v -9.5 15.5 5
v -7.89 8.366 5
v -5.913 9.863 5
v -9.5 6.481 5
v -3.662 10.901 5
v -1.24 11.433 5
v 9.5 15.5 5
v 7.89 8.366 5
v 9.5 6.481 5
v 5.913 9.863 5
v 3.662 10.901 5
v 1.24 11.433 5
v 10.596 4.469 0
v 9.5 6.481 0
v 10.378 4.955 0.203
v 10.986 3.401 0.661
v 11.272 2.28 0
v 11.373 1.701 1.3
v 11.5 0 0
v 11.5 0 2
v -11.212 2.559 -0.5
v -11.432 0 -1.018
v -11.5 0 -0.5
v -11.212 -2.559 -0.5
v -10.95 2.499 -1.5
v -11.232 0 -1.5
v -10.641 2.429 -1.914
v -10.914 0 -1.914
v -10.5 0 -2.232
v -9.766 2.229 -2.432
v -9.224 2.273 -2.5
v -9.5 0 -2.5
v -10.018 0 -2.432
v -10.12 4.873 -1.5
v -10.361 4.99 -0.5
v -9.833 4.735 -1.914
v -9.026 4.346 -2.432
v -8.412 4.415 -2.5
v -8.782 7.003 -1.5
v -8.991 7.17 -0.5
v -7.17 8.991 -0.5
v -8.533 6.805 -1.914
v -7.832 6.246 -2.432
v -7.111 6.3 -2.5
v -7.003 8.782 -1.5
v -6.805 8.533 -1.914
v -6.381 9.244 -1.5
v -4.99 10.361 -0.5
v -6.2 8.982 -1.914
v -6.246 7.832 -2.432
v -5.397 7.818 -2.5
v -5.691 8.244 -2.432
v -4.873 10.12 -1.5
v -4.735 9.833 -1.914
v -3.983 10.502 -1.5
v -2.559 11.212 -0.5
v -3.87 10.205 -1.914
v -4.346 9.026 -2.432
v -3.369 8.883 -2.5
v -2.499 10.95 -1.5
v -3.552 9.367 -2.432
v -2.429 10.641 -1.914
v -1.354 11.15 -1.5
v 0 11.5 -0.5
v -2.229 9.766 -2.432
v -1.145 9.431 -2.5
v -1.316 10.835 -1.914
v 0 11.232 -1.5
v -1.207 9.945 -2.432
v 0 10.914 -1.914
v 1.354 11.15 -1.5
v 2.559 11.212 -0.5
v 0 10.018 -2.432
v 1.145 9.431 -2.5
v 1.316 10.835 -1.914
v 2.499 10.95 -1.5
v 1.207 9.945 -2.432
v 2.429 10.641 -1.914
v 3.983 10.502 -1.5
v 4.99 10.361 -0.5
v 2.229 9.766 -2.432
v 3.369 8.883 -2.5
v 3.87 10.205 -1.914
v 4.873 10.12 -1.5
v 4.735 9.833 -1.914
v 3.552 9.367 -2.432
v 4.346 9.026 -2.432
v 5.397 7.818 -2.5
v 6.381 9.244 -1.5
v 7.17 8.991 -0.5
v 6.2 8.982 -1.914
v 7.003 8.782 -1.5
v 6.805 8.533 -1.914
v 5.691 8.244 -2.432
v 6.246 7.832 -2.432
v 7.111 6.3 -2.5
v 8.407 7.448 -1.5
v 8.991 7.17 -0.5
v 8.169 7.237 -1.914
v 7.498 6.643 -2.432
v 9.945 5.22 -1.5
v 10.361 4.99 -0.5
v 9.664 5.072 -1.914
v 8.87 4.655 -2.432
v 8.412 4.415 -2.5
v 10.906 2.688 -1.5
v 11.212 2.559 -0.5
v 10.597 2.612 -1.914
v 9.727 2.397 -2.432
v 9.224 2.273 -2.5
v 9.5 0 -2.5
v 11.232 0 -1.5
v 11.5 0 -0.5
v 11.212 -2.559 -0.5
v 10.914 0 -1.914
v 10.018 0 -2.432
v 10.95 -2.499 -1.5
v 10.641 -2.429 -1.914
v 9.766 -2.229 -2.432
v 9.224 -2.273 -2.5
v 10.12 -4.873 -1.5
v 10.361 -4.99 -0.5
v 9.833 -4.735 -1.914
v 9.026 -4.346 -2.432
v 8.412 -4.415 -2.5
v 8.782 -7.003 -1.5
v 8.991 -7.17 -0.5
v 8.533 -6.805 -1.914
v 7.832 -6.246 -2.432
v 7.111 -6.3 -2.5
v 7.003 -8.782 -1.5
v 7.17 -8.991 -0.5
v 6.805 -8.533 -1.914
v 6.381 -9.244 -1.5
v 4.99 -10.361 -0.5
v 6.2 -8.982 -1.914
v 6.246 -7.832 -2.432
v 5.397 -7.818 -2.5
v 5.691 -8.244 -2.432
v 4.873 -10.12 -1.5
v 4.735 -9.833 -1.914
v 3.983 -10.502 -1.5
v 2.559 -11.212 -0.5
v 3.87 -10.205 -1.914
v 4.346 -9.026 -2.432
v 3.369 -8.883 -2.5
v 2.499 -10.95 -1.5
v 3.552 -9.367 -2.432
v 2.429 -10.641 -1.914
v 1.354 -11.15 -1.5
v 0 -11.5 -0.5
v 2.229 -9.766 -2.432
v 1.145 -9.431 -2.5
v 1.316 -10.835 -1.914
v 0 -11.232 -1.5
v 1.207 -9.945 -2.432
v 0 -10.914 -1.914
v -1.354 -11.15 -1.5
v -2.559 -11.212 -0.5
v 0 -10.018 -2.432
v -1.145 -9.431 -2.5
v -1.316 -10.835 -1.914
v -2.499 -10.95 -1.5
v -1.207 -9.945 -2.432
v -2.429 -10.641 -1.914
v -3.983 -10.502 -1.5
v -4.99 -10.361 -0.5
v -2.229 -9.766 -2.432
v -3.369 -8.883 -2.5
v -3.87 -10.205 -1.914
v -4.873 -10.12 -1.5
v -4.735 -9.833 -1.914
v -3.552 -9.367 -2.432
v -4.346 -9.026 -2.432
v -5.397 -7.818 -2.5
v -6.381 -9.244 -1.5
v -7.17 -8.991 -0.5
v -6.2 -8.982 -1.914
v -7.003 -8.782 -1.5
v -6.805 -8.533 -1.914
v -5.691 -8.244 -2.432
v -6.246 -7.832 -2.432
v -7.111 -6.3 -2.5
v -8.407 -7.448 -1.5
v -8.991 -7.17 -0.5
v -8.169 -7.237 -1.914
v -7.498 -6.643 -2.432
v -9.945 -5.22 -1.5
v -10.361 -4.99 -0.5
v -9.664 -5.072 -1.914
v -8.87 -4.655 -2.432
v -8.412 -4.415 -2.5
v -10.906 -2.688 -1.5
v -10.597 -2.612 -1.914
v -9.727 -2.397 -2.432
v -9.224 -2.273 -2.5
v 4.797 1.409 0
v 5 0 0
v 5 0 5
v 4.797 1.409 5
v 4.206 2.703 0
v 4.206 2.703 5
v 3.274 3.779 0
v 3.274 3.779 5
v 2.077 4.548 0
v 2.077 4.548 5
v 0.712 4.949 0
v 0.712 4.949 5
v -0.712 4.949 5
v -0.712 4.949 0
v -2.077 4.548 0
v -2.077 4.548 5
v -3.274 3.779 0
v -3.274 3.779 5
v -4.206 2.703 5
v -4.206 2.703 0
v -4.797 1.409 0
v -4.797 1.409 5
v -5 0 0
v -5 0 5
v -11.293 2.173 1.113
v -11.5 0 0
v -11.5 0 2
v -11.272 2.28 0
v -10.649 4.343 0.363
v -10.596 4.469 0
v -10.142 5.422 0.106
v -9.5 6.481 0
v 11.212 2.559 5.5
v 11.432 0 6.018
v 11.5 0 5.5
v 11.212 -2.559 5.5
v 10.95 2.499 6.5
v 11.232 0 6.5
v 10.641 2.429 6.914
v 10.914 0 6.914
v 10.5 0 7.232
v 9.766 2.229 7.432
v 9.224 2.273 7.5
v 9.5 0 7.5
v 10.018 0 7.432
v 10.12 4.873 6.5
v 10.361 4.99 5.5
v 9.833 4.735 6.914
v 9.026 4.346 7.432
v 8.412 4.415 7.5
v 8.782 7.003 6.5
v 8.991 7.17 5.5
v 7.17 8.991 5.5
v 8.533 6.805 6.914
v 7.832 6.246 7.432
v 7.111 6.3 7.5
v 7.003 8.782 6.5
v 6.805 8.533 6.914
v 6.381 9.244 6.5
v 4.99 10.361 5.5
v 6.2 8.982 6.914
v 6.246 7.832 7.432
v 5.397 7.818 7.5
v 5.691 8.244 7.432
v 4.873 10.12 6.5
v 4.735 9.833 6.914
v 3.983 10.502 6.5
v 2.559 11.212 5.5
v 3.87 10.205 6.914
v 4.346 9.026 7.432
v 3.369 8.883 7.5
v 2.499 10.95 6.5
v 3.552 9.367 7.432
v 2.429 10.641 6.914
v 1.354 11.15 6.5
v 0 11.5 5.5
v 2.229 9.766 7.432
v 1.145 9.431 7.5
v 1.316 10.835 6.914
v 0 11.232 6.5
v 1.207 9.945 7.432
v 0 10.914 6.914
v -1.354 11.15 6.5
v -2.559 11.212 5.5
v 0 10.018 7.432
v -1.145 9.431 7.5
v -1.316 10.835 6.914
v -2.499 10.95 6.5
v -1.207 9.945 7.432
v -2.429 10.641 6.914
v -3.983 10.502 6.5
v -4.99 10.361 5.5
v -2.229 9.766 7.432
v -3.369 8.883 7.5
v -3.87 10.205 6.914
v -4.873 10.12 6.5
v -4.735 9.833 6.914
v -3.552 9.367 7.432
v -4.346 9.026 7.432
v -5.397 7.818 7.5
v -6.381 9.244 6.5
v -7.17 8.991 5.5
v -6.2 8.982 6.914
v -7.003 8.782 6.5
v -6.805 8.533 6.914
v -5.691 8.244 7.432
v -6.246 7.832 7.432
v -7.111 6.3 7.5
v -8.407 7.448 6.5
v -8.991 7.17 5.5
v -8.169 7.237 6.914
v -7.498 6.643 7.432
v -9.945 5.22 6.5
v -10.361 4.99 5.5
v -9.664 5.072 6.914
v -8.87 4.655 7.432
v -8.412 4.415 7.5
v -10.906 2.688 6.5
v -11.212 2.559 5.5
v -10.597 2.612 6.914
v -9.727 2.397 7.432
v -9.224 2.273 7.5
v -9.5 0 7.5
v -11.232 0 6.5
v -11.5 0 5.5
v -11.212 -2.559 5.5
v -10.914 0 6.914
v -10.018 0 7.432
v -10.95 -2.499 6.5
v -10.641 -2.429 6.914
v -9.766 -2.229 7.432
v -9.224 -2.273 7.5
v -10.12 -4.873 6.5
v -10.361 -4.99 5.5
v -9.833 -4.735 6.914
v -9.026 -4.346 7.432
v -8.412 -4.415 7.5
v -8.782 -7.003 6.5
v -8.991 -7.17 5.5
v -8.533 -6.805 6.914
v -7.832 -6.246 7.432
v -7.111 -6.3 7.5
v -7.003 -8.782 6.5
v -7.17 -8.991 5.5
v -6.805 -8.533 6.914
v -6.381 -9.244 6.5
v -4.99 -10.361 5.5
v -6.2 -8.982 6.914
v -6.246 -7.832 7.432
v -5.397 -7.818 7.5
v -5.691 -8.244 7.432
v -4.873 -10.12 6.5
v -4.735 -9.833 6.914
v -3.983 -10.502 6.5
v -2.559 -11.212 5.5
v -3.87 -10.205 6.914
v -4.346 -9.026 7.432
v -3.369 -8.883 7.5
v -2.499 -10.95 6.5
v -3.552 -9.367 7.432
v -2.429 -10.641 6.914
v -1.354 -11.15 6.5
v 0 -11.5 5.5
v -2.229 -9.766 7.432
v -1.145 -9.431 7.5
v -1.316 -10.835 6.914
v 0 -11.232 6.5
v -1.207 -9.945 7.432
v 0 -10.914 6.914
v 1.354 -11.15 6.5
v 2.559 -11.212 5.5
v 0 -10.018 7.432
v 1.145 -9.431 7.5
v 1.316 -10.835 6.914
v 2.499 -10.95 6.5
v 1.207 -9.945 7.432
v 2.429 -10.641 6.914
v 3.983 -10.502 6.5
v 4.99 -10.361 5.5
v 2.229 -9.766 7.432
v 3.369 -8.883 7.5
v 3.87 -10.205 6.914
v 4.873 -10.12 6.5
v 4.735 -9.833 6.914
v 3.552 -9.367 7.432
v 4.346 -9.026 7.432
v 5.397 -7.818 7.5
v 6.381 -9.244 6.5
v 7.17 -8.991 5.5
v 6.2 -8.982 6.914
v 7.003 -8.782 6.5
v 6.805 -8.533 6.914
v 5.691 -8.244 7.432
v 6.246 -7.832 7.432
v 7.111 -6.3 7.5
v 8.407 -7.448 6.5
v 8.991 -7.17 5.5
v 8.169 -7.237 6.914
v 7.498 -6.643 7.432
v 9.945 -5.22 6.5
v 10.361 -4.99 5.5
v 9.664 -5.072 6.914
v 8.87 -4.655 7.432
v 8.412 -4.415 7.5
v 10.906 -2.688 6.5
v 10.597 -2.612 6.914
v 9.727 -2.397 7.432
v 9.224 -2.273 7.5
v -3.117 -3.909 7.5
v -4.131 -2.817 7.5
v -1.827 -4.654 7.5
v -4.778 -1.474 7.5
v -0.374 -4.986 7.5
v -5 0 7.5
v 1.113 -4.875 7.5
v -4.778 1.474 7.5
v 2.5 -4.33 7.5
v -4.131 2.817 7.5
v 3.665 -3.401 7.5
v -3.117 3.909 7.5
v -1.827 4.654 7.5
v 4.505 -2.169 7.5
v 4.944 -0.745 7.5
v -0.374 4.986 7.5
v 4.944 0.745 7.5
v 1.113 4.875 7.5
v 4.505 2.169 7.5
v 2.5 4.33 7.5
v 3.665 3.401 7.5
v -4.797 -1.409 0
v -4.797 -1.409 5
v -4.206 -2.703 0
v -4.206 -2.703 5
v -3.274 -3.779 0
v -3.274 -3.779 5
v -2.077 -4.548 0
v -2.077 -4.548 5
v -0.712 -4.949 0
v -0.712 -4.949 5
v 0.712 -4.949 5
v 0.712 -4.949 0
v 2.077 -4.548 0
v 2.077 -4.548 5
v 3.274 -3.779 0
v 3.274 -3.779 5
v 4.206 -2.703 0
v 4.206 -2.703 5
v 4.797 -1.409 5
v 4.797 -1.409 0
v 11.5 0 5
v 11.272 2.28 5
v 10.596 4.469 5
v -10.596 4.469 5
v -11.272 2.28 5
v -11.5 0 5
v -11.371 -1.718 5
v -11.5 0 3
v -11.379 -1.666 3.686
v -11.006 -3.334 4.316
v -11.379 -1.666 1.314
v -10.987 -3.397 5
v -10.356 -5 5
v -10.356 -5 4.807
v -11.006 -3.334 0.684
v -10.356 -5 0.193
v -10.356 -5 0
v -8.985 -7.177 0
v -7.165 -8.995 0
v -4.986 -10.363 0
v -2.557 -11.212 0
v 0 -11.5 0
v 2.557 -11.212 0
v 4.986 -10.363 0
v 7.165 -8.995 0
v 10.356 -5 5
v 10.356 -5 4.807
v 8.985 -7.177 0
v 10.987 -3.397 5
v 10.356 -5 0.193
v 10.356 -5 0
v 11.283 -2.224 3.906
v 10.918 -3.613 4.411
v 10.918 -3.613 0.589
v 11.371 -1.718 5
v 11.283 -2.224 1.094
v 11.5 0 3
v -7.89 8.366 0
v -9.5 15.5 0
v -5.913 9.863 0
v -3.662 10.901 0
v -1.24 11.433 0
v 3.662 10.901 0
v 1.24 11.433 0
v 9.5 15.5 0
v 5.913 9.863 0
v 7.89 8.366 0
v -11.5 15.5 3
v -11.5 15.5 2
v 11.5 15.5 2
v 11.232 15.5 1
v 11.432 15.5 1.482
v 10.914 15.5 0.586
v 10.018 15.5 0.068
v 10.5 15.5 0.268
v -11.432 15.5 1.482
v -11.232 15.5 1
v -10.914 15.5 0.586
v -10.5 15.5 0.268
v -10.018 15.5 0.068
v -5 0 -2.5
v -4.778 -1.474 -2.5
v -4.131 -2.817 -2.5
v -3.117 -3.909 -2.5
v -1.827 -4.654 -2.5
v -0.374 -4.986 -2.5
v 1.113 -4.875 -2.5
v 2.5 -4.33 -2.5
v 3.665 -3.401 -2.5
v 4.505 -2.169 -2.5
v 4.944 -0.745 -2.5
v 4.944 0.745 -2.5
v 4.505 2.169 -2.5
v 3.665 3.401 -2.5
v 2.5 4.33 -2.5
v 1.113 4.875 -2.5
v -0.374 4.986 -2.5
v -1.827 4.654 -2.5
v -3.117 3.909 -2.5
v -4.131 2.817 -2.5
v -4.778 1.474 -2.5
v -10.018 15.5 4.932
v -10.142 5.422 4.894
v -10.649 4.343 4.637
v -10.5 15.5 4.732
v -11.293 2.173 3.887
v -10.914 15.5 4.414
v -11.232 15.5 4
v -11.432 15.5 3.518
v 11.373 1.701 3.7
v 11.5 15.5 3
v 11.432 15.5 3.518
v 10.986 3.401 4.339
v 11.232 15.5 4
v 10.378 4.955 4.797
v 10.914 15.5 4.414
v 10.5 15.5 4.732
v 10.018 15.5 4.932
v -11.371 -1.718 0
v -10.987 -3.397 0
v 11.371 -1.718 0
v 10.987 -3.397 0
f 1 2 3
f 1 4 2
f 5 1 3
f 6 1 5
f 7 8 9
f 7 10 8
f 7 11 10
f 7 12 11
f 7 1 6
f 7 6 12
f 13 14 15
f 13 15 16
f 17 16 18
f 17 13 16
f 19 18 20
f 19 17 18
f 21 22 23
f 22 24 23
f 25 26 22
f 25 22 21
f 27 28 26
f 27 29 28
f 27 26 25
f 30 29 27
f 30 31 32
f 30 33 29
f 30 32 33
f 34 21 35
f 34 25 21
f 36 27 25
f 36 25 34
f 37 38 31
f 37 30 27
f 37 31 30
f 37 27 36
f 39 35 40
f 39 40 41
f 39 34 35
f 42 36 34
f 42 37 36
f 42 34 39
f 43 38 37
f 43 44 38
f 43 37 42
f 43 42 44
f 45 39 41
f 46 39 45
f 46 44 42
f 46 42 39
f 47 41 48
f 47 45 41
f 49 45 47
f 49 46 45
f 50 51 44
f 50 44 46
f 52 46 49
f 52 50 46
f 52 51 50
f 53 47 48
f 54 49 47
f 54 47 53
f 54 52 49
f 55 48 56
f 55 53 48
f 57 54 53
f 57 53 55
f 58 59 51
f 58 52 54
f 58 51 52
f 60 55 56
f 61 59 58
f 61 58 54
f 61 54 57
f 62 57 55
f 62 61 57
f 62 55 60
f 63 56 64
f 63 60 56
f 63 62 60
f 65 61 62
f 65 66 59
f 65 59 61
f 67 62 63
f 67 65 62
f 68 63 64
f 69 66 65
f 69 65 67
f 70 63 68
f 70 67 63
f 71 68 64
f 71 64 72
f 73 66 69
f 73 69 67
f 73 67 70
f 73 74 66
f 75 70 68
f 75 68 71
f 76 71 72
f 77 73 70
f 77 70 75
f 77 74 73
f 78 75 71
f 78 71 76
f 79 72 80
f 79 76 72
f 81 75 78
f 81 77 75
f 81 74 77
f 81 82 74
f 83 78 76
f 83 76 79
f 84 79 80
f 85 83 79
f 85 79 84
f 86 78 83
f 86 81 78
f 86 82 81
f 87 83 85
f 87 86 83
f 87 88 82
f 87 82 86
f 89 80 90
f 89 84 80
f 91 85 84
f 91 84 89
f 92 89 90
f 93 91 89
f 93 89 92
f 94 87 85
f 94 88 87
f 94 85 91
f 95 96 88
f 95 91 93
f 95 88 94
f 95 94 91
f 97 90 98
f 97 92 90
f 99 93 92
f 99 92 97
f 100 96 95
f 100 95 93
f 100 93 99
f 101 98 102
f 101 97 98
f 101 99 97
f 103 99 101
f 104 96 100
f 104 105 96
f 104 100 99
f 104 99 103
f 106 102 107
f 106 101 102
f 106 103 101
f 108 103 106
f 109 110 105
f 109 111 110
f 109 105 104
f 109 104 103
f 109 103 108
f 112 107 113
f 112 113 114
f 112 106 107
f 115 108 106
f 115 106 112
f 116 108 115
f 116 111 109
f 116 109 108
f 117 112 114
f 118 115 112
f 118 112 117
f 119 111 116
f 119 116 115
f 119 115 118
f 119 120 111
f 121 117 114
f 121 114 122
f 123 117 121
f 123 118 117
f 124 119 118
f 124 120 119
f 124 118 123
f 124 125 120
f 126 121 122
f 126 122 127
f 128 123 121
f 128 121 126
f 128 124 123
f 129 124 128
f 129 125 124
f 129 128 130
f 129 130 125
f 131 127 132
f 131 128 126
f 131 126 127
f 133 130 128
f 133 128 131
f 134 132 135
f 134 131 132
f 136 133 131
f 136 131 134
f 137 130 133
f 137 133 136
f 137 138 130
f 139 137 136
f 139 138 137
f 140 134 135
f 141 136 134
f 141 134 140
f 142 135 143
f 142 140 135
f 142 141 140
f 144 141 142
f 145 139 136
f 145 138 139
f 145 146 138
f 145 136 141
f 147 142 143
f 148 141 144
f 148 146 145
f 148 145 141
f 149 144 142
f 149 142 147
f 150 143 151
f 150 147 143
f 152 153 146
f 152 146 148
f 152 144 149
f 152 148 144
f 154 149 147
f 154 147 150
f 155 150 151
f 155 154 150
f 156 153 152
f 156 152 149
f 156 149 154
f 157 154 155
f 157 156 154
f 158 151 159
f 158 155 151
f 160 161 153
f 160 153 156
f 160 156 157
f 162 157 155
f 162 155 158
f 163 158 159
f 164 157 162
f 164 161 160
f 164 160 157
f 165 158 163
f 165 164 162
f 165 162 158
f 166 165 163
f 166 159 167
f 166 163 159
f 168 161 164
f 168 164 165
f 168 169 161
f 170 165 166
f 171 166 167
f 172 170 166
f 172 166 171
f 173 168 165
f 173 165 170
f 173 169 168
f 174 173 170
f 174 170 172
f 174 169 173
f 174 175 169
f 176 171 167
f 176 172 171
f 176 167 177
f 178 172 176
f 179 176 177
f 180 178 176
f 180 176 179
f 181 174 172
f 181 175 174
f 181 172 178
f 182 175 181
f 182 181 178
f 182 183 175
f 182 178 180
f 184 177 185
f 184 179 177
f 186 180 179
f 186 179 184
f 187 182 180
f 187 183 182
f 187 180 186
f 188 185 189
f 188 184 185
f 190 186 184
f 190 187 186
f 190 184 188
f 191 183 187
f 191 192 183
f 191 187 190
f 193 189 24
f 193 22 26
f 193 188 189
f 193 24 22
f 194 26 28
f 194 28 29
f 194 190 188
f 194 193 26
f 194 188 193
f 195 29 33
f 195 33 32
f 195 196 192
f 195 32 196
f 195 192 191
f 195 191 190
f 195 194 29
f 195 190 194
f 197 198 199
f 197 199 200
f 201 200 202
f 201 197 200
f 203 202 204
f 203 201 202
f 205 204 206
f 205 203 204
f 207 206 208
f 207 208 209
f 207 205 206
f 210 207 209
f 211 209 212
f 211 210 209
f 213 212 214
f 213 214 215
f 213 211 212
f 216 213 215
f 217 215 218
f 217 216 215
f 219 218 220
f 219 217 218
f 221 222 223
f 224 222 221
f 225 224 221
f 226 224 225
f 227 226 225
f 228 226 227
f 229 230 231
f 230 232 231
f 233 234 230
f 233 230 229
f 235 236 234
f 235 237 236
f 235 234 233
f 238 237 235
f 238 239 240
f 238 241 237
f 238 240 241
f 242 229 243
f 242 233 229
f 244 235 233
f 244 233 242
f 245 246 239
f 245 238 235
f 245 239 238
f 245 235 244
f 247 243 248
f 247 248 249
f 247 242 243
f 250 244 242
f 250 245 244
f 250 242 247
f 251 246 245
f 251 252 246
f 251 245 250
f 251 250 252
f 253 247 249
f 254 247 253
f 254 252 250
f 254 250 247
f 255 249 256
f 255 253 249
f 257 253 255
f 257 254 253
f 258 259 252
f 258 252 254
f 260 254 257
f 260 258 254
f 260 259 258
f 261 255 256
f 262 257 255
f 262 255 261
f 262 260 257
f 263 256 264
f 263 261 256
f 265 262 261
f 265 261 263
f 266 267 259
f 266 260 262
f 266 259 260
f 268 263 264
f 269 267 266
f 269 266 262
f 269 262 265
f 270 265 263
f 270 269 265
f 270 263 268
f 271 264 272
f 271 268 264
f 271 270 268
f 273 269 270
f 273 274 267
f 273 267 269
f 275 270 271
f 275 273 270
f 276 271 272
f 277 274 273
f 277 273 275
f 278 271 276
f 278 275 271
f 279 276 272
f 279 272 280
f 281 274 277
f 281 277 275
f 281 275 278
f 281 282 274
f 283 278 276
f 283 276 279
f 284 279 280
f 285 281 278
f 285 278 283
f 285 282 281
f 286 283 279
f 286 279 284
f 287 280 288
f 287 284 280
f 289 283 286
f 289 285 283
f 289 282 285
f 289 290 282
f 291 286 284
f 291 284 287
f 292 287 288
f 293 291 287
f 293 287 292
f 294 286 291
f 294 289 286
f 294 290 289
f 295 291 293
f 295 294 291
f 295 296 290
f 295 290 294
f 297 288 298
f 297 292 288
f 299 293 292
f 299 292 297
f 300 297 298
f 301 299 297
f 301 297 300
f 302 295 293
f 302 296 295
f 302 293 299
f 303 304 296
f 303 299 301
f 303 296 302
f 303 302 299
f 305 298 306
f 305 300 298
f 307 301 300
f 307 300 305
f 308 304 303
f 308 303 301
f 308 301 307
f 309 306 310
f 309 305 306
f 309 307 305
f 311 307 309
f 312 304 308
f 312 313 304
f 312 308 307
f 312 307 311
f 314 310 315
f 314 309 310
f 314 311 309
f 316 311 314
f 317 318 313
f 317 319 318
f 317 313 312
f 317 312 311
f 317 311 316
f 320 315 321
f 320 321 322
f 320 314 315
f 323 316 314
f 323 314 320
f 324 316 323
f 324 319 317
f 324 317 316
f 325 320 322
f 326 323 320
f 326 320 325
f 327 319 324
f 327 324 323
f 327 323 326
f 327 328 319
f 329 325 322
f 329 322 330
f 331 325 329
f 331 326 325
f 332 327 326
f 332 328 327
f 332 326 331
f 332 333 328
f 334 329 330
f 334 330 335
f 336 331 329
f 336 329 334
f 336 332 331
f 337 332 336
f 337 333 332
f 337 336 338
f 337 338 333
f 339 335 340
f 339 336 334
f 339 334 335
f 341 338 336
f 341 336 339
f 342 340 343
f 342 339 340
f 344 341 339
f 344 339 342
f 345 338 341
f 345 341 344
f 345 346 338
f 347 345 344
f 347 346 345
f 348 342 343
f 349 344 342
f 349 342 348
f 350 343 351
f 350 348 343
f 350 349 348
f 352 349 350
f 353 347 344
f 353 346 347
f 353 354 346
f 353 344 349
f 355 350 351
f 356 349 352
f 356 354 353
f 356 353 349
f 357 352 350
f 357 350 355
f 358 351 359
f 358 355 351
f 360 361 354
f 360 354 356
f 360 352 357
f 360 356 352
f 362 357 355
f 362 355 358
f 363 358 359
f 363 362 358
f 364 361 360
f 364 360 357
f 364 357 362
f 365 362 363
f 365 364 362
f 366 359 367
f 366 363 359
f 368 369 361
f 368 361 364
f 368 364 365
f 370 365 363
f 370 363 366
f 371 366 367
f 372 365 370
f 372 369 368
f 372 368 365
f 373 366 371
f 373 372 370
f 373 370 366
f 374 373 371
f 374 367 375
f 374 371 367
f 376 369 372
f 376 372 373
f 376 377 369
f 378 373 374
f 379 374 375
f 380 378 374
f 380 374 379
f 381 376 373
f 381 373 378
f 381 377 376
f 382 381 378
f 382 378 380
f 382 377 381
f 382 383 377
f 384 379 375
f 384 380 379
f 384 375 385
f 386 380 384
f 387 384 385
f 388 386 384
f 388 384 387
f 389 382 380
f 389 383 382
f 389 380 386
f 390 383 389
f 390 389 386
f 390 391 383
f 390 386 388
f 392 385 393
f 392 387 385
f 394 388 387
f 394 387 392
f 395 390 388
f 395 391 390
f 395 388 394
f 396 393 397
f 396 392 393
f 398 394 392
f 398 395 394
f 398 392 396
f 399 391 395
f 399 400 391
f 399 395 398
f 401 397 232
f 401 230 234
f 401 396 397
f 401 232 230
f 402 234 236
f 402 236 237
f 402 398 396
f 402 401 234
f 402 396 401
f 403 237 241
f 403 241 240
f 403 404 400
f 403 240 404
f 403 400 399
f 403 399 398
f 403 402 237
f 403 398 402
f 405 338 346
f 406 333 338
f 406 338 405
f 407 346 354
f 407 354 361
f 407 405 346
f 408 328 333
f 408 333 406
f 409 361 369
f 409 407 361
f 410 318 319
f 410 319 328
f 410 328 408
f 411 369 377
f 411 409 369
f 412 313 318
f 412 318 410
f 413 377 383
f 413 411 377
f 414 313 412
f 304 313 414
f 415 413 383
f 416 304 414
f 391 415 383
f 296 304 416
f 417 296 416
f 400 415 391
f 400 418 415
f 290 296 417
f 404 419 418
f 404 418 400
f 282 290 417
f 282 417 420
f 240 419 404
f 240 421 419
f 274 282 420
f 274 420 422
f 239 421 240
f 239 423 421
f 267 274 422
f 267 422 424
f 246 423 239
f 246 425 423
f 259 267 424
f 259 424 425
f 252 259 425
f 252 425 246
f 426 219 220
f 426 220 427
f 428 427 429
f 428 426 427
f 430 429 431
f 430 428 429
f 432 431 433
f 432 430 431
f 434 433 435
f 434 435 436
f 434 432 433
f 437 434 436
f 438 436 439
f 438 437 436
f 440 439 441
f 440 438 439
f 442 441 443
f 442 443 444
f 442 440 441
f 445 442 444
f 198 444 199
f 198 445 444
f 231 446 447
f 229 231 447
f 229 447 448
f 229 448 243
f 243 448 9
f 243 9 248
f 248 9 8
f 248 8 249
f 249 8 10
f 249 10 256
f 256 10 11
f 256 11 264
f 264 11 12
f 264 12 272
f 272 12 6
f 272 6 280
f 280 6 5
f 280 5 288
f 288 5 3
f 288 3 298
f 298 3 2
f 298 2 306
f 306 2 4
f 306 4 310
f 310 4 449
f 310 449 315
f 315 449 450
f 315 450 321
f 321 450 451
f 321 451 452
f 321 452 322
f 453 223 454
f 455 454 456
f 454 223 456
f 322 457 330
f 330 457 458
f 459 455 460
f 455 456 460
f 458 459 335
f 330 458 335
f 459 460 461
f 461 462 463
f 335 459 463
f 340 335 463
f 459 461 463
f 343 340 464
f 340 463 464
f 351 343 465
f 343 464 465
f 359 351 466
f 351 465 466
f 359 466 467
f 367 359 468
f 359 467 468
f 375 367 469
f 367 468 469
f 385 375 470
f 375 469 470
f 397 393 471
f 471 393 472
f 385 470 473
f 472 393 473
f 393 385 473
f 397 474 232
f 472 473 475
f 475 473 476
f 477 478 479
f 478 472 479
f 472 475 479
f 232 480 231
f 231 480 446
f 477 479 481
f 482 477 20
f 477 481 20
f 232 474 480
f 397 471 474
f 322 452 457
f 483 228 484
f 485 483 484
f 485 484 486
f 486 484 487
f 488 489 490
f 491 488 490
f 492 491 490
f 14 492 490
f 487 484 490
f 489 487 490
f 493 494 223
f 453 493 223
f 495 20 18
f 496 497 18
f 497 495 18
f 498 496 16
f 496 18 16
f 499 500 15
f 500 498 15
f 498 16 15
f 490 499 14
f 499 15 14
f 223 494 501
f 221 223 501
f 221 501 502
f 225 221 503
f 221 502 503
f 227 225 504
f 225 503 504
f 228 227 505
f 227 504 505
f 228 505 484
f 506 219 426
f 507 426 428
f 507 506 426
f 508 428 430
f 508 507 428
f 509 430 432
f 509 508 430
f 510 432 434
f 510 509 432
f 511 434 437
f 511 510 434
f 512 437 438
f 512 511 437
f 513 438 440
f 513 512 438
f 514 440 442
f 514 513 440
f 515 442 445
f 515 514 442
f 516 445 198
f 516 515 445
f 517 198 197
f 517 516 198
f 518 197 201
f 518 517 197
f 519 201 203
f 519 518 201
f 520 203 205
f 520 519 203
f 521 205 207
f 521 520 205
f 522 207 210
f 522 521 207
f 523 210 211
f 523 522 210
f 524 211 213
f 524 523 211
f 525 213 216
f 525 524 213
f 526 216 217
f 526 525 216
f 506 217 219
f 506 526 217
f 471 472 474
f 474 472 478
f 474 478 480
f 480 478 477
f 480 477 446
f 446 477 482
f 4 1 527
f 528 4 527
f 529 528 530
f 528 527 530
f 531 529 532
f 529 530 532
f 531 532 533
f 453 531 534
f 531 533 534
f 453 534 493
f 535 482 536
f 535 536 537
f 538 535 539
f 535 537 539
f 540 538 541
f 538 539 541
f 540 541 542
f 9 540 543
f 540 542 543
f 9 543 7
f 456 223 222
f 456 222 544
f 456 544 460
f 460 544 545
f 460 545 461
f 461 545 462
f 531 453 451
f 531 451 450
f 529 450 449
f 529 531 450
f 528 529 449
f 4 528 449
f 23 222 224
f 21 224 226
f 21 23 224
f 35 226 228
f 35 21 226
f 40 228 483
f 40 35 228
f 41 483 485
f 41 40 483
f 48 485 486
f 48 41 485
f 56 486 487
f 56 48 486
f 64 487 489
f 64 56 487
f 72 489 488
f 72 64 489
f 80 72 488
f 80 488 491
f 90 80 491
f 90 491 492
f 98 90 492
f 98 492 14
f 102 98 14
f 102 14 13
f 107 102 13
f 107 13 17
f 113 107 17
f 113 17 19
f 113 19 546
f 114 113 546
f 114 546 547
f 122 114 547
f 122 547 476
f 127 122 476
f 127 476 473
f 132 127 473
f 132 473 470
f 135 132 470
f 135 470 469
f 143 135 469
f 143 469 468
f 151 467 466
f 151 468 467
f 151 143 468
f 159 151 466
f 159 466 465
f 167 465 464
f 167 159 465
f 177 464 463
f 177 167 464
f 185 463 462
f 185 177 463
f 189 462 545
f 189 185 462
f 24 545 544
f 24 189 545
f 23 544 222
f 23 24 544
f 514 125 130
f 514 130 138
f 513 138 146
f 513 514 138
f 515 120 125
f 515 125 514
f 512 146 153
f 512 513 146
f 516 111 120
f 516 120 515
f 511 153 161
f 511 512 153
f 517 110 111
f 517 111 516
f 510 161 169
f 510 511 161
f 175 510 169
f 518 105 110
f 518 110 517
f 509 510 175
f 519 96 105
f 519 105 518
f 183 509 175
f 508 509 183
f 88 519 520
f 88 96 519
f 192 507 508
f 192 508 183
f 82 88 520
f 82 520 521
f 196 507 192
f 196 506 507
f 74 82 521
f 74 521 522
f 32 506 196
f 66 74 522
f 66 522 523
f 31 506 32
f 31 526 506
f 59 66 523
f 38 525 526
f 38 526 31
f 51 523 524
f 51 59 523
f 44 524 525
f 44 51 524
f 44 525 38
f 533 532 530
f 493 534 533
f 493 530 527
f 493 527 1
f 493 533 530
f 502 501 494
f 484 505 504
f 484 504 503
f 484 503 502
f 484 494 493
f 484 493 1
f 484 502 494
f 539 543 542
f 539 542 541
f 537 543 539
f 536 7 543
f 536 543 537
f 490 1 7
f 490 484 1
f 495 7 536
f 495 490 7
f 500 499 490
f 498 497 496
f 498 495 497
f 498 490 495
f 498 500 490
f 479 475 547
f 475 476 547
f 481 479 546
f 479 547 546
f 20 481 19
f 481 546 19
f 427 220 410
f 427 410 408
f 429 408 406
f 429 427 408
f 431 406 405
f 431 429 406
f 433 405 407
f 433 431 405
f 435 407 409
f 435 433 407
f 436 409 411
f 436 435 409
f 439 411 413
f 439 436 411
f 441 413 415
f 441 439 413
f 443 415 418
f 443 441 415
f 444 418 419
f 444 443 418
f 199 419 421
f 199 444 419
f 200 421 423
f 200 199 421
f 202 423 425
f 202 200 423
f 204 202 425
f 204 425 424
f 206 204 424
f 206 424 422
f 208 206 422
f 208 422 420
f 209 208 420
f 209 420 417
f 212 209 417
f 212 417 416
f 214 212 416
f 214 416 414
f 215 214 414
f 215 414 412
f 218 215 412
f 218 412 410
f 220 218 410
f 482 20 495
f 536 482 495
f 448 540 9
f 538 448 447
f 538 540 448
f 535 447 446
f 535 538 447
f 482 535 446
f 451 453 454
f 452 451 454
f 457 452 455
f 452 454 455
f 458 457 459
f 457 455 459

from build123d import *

# Parameters (mm, degrees)
SKETCH1_R           = 11.5
SKETCH1_R_2         = 5
SKETCH1_W           = 23
SKETCH1_H           = 4
BOSS_EXTRUDE2_DEPTH = 5
SKETCH3_R           = 11.5
BOSS_EXTRUDE3_DEPTH = 2.5
BOSS_EXTRUDE4_START = 2.5
SKETCH4_R           = 11.5
BOSS_EXTRUDE4_DEPTH = 2.5
CUT_EXTRUDE2_START  = -17.5
SKETCH5_R           = 5
CUT_EXTRUDE2_DEPTH  = 17.5
FILLET1_R           = 2


with BuildPart() as part:
    # Sketch1 → Boss-Extrude2 (new body)
    # profile 1 of 4: a face of its own
    with BuildSketch(Plane.XY):
        Circle(SKETCH1_R)
        Circle(SKETCH1_R_2, mode=Mode.SUBTRACT)
    # profile 2 of 4: a face of its own
    with BuildSketch(Plane.XY):
        with BuildLine():
            ThreePointArc((1.6e-08, 11.5), (8.131727989, 8.131727978), (11.5, 0))
            Line((11.5, 0), (11.5, 11.5))
            Line((11.5, 11.5), (1.6e-08, 11.5))
        make_face()
    # profile 3 of 4: a face of its own
    with BuildSketch(Plane.XY):
        with Locations((0, 13.5)):
            Rectangle(SKETCH1_W, SKETCH1_H)
    # profile 4 of 4: a face of its own
    with BuildSketch(Plane.XY):
        with BuildLine():
            Line((-11.5, 11.5), (-11.5, 0))
            ThreePointArc((-11.5, 0), (-8.131727978, 8.131727989), (1.6e-08, 11.5))
            Line((1.6e-08, 11.5), (-11.5, 11.5))
        make_face()
    extrude(amount=BOSS_EXTRUDE2_DEPTH)

    # Sketch3 → Boss-Extrude3 (add)
    with BuildSketch(Plane.XY.offset(5)):
        Circle(SKETCH3_R)
    extrude(amount=BOSS_EXTRUDE3_DEPTH)

    # Sketch4 → Boss-Extrude4 (add)
    with BuildSketch(Plane(origin=(0, 0, 0), x_dir=(-1, 0, 0), z_dir=(0, 0, -1)).offset(BOSS_EXTRUDE4_START)):
        Circle(SKETCH4_R)
    extrude(amount=-BOSS_EXTRUDE4_DEPTH)

    # Sketch5 → Cut-Extrude2 (cut)
    with BuildSketch(Plane.XY.offset(7.5).offset(CUT_EXTRUDE2_START)):
        with Locations(Location((0, 0, 0), (0, 0, 180))):
            Circle(SKETCH5_R)
    extrude(amount=CUT_EXTRUDE2_DEPTH, mode=Mode.SUBTRACT)

    # Fillet1
    # the kernel refuses this fillet: 2 mm, written as the material it takes off along each edge
    with BuildSketch(Plane(origin=(-11.5, 20.5, 0), x_dir=(0, 0, 1), z_dir=(0, -1, 0))) as fillet1_piece_1_section:
        with BuildLine():
            CenterArc((FILLET1_R, -FILLET1_R), FILLET1_R, 90, 90)
            Line((0, -FILLET1_R), (0, 0))
            Line((0, 0), (FILLET1_R, 0))
        make_face()
    fillet1_piece_1 = extrude(amount=25.5, mode=Mode.PRIVATE)
    fillet1_piece_1 = fillet1_piece_1 - Plane(origin=(0, 0, 0.471607453), x_dir=(1, 0, 0), z_dir=(0, 0, -1)) * Cylinder(11.5, 59, mode=Mode.PRIVATE)
    add(fillet1_piece_1, mode=Mode.SUBTRACT)
    with BuildSketch(Plane(origin=(-11.5, 20.5, 5), x_dir=(1, 0, 0), z_dir=(0, -1, 0))) as fillet1_piece_2_section:
        with BuildLine():
            CenterArc((FILLET1_R, -FILLET1_R), FILLET1_R, 90, 90)
            Line((0, -FILLET1_R), (0, 0))
            Line((0, 0), (FILLET1_R, 0))
        make_face()
    fillet1_piece_2 = extrude(amount=25.5, mode=Mode.PRIVATE)
    fillet1_piece_2 = fillet1_piece_2 - Plane(origin=(0, 0, 4.528392342), x_dir=(1, 0, 0), z_dir=(0, 0, -1)) * Cylinder(11.5, 59, mode=Mode.PRIVATE)
    add(fillet1_piece_2, mode=Mode.SUBTRACT)
    with BuildSketch(Plane(origin=(11.5, -5, 0), x_dir=(0, 0, 1), z_dir=(0, 1, 0))) as fillet1_piece_3_section:
        with BuildLine():
            CenterArc((FILLET1_R, -FILLET1_R), FILLET1_R, 90, 90)
            Line((0, -FILLET1_R), (0, 0))
            Line((0, 0), (FILLET1_R, 0))
        make_face()
    fillet1_piece_3 = extrude(amount=25.5, mode=Mode.PRIVATE)
    fillet1_piece_3 = fillet1_piece_3 - Plane(origin=(0, 0, 0.471608914), x_dir=(1, 0, 0), z_dir=(0, 0, -1)) * Cylinder(11.5, 59, mode=Mode.PRIVATE)
    add(fillet1_piece_3, mode=Mode.SUBTRACT)
    with BuildSketch(Plane(origin=(11.5, 20.5, 5), x_dir=(0, 0, -1), z_dir=(0, -1, 0))) as fillet1_piece_4_section:
        with BuildLine():
            CenterArc((FILLET1_R, -FILLET1_R), FILLET1_R, 90, 90)
            Line((0, -FILLET1_R), (0, 0))
            Line((0, 0), (FILLET1_R, 0))
        make_face()
    fillet1_piece_4 = extrude(amount=25.5, mode=Mode.PRIVATE)
    fillet1_piece_4 = fillet1_piece_4 - Plane(origin=(0, 0, 4.528391109), x_dir=(1, 0, 0), z_dir=(0, 0, -1)) * Cylinder(11.5, 59, mode=Mode.PRIVATE)
    add(fillet1_piece_4, mode=Mode.SUBTRACT)
    with BuildSketch(Plane(origin=(0, 0, 7.5), x_dir=(1, 0, 0), z_dir=(0, -1, 0))) as fillet1_piece_5:
        with BuildLine():
            CenterArc((11.5 - FILLET1_R, -FILLET1_R), FILLET1_R, 0, 90)
            Line((11.5 - FILLET1_R, 0), (11.5, 0))
            Line((11.5, 0), (11.5, -FILLET1_R))
        make_face()
    revolve(axis=Axis((0, 0, 7.5), (0, 0, 1)), mode=Mode.SUBTRACT)
    with BuildSketch(Plane(origin=(0, 0, -2.5), x_dir=(-1, 0, 0), z_dir=(0, -1, 0))) as fillet1_piece_6:
        with BuildLine():
            CenterArc((11.5 - FILLET1_R, -FILLET1_R), FILLET1_R, 0, 90)
            Line((11.5 - FILLET1_R, 0), (11.5, 0))
            Line((11.5, 0), (11.5, -FILLET1_R))
        make_face()
    revolve(axis=Axis((0, 0, -2.5), (0, 0, -1)), mode=Mode.SUBTRACT)


solid = part.part
